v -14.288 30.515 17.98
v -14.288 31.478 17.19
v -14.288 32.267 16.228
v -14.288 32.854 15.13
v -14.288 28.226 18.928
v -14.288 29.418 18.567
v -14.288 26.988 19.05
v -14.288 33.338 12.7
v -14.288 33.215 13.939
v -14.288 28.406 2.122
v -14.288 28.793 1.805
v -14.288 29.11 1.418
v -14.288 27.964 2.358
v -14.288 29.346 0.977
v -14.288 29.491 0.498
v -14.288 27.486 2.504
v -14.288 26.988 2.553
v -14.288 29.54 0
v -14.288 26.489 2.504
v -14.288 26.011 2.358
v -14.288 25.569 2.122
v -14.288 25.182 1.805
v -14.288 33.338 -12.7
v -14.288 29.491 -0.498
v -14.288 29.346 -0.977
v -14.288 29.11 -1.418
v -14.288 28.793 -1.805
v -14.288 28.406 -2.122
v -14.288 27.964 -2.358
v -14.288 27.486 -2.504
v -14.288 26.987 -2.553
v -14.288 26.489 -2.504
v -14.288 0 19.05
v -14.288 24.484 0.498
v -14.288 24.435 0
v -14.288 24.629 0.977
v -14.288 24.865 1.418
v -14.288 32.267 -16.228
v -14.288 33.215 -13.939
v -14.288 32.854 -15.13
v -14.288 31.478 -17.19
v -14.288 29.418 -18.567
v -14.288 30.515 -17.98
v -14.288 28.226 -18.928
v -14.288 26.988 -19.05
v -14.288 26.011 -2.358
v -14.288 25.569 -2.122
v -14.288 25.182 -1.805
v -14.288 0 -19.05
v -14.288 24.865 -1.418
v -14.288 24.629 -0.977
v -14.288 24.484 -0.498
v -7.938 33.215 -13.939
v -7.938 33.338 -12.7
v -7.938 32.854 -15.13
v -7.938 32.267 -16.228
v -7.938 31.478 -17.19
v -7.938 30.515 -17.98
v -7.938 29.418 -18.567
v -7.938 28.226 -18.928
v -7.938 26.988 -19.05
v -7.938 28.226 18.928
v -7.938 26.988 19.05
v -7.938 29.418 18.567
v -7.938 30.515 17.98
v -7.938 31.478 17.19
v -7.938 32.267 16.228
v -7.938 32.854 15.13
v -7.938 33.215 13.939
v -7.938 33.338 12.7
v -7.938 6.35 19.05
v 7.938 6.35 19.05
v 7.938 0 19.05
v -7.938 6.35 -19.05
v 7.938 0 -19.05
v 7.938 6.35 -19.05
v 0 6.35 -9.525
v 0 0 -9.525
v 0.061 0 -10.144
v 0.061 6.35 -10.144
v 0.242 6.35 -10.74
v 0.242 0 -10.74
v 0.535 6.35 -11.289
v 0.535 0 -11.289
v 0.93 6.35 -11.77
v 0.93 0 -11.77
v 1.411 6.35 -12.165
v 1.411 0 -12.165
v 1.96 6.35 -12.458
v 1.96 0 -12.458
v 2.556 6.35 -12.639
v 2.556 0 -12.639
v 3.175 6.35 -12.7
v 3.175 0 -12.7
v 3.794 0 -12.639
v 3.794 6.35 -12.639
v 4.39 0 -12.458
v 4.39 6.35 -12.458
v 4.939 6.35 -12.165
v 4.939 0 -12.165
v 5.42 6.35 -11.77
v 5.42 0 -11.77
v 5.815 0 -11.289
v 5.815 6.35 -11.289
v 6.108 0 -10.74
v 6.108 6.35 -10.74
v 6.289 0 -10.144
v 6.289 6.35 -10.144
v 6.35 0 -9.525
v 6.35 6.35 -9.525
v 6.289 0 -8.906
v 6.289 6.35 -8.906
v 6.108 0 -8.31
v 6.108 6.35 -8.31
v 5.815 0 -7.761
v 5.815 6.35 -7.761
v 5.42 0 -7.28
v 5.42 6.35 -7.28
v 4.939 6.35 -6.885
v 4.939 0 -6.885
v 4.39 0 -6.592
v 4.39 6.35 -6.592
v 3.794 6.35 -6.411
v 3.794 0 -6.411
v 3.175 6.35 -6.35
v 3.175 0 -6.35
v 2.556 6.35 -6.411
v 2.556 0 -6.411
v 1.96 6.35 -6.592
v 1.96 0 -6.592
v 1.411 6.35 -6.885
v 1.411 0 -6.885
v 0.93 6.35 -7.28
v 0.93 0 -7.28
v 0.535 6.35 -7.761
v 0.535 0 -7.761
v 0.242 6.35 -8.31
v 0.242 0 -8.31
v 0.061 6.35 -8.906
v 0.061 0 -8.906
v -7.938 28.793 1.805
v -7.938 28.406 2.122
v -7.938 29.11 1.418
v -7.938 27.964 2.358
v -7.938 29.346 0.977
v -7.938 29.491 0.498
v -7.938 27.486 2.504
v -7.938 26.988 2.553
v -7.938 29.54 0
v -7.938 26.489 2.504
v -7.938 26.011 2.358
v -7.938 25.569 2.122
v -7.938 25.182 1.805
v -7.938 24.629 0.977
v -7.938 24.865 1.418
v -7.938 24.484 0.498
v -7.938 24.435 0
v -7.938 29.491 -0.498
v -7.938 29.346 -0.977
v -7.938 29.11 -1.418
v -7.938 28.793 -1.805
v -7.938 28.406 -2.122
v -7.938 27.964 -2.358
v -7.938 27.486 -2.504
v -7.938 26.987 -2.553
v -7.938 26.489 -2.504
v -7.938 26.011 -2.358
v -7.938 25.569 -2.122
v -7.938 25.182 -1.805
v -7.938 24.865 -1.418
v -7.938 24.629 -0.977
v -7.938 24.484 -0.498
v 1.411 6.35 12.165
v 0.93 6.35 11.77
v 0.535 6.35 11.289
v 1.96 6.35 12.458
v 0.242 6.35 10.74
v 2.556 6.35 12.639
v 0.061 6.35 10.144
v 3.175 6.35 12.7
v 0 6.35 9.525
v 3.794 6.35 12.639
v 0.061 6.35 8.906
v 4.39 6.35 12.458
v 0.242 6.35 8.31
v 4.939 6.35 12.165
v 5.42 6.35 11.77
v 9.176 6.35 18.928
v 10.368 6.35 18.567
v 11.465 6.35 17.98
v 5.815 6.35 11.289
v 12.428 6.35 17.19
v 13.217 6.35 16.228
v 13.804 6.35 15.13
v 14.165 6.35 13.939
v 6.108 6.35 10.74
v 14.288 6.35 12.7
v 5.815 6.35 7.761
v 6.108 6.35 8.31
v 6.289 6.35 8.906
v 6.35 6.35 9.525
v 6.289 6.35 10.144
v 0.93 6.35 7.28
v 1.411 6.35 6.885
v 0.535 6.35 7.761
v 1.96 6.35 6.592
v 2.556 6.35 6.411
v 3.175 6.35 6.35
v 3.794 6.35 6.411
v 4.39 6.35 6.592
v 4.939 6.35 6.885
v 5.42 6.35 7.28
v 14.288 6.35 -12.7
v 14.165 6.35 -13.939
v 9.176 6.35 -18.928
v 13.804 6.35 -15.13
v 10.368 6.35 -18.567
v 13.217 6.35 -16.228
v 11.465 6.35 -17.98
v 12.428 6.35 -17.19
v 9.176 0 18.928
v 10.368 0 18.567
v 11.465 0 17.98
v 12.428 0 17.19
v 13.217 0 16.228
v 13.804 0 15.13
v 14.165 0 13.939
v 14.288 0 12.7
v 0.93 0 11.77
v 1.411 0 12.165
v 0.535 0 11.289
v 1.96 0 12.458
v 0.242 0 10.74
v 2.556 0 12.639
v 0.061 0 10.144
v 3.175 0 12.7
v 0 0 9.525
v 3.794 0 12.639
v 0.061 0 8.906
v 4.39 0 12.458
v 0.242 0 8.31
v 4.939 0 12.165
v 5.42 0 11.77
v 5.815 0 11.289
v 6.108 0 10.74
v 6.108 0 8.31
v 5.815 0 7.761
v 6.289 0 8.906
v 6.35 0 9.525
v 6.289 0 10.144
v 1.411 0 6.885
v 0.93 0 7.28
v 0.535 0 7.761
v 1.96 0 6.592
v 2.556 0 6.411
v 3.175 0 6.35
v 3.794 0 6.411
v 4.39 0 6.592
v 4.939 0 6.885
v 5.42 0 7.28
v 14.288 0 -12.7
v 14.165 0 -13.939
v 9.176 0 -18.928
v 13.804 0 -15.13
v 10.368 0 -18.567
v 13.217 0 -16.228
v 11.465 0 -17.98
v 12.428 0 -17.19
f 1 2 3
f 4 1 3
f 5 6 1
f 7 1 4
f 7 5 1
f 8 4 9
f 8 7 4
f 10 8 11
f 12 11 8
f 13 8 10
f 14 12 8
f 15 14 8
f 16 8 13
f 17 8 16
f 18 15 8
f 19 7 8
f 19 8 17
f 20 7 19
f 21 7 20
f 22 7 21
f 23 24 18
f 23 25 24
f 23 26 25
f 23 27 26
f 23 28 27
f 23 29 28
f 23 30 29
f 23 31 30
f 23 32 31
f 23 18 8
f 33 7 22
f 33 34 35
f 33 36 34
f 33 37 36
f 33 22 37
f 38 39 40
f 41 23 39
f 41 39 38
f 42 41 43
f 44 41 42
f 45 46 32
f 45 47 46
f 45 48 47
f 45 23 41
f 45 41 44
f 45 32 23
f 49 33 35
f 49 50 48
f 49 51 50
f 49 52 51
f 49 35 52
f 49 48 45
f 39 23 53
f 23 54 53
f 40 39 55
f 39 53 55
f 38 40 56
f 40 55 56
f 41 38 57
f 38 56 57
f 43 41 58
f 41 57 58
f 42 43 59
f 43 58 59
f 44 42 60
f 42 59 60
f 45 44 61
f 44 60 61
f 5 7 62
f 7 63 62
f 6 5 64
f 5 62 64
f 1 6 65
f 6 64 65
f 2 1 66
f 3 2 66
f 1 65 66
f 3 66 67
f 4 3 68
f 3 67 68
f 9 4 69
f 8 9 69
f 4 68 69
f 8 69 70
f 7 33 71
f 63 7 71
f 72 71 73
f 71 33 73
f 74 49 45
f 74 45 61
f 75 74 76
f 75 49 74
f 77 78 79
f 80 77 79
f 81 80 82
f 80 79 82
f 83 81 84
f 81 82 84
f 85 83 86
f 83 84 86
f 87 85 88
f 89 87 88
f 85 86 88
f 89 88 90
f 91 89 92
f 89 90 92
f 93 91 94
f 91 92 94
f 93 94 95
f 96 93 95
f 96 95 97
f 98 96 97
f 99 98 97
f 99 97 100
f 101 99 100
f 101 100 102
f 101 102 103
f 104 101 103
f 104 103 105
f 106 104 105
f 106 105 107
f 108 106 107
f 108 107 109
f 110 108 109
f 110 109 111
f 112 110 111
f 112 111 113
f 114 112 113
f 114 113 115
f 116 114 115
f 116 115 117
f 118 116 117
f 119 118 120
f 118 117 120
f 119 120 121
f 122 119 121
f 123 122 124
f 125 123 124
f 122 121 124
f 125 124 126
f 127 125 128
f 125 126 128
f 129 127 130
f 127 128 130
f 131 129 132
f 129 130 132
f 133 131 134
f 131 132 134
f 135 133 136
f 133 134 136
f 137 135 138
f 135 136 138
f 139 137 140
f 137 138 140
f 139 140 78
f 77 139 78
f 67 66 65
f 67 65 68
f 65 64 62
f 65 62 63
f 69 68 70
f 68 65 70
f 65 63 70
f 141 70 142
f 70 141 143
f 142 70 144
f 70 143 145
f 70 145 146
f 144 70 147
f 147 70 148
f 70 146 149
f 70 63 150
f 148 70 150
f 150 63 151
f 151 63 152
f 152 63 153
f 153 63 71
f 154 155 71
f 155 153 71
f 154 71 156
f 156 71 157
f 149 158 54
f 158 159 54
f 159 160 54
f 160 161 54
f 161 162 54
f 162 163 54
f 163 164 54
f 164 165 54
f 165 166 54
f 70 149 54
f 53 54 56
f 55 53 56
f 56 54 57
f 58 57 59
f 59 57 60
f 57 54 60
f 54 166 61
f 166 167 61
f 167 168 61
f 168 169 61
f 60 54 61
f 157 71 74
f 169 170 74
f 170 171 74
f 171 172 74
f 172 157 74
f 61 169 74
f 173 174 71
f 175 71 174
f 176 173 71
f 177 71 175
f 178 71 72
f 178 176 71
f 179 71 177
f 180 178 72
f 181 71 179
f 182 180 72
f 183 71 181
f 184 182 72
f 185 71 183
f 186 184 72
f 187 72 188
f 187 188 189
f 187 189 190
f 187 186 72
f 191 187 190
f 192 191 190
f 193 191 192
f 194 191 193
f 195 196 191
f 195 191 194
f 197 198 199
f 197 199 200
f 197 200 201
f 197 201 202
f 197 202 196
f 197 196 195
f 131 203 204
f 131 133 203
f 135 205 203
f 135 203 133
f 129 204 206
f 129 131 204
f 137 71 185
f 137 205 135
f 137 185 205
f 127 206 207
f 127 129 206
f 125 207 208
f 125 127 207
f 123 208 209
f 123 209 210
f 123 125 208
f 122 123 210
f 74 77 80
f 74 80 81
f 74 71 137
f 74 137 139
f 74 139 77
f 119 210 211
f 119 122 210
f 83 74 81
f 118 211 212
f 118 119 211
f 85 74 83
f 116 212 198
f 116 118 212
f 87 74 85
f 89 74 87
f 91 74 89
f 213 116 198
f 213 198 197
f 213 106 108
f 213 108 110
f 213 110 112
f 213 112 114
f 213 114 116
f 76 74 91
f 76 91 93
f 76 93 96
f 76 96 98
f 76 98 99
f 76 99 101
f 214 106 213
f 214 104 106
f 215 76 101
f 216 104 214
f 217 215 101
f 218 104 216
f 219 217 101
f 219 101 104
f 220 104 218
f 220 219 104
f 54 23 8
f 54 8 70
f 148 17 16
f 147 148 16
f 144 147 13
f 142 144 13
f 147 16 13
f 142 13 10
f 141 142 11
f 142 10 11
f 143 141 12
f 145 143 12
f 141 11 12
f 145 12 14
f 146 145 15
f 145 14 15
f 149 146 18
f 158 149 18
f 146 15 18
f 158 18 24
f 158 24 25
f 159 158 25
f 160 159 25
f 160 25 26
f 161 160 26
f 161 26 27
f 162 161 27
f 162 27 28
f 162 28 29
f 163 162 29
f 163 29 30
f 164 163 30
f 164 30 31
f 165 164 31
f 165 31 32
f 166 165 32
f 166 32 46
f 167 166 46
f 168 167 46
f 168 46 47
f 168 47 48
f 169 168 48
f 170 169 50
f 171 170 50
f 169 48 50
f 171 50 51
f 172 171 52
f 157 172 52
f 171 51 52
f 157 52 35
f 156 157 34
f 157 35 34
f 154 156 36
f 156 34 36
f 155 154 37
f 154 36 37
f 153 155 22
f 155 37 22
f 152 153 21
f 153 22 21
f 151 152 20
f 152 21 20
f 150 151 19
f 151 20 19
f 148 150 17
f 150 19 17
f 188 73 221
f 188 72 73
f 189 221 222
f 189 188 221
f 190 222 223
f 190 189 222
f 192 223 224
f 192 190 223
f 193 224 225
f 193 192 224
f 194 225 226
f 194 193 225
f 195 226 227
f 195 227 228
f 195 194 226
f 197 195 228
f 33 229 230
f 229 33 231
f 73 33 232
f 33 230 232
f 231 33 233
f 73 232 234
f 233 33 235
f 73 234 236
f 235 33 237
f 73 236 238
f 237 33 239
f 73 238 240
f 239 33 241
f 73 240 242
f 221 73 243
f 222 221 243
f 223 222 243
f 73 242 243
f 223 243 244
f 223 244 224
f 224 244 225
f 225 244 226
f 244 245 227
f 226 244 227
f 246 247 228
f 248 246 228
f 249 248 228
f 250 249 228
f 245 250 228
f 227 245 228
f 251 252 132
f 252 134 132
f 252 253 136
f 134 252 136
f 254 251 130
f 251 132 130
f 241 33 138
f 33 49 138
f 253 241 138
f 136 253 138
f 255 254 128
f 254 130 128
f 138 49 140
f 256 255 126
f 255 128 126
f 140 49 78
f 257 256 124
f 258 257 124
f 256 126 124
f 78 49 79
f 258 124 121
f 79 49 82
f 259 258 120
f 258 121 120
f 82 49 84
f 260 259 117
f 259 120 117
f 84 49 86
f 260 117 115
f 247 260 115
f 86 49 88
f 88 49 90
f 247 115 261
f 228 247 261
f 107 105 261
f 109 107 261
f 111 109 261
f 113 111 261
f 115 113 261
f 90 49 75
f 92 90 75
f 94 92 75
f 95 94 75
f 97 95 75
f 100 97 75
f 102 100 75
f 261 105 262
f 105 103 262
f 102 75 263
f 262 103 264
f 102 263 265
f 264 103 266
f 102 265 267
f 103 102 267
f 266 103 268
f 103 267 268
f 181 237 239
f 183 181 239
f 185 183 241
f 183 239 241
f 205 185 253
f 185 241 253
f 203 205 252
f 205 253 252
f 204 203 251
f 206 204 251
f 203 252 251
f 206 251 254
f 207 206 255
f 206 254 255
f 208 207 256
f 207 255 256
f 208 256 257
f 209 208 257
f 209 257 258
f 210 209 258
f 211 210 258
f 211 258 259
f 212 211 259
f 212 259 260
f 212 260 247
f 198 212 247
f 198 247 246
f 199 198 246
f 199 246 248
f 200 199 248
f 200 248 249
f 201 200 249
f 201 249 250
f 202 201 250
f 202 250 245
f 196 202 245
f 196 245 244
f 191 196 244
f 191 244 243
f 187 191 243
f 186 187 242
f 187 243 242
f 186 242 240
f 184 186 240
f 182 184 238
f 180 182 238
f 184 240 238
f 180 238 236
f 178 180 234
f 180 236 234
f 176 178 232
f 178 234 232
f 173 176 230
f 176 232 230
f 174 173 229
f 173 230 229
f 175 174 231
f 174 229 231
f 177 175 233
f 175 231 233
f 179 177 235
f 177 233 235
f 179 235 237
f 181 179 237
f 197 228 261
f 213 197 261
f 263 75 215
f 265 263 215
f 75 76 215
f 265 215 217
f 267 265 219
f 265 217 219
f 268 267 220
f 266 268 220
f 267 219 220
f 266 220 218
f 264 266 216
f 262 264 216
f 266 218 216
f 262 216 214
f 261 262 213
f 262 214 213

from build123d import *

# Parameters (mm, degrees)
SKETCH8_W                   = 6.35
SKETCH8_H                   = 38.1
SKETCH8_W_2                 = 22.225
BOSS_EXTRUDE2_DEPTH         = 6.35
BOSS_EXTRUDE3_START         = 6.35
SKETCH8_3_W                 = 6.35
SKETCH8_3_H                 = 38.1
BOSS_EXTRUDE3_DEPTH         = 26.9875
F_1_4_0_25_DIAMETER_HOLE2_D = 6.35
F_1_4_20_TAPPED_HOLE1_D     = 5.1054
F_1_4_20_TAPPED_HOLE1_DEPTH = 16.51
F_1_4_20_TAPPED_HOLE1_TIP   = 1.533816902
FILLET1_R                   = 6.35
FILLET2_R                   = 6.35


with BuildPart() as part:
    # Sketch8 → Boss-Extrude2 (new body)
    with BuildSketch(Plane(origin=(0, 0, 0), x_dir=(1, 0, 0), z_dir=(0, 1, 0))):
        with Locations((-11.1125, 0)):
            Rectangle(SKETCH8_W, SKETCH8_H)
        with Locations((3.175, 0)):
            Rectangle(SKETCH8_W_2, SKETCH8_H)
    extrude(amount=BOSS_EXTRUDE2_DEPTH)

    # Sketch8<3> → Boss-Extrude3 (add)
    with BuildSketch(Plane(origin=(0, 0, 0), x_dir=(1, 0, 0), z_dir=(0, 1, 0)).offset(BOSS_EXTRUDE3_START)):
        with Locations((-11.1125, 0)):
            Rectangle(SKETCH8_3_W, SKETCH8_3_H)
    extrude(amount=BOSS_EXTRUDE3_DEPTH)

    # 1/4 (0.25) Diameter Hole2 (through all)
    with Locations(Plane(origin=(0, 6.35, 0), x_dir=(1, 0, 0), z_dir=(0, 1, 0))):
        with Locations((3.175, -9.525), (3.175, 9.525)):
            Hole(F_1_4_0_25_DIAMETER_HOLE2_D / 2)

    # 1/4-20 Tapped Hole1
    with Locations(Plane(origin=(-7.9375, 0, 0), x_dir=(0, 0, -1), z_dir=(1, 0, 0))):
        with Locations((0, 26.9875)):
            Hole(F_1_4_20_TAPPED_HOLE1_D / 2, depth=F_1_4_20_TAPPED_HOLE1_DEPTH)
            with Locations((0, 0, -(F_1_4_20_TAPPED_HOLE1_DEPTH + F_1_4_20_TAPPED_HOLE1_TIP / 2))):  # 118° drill point
                Cone(0, F_1_4_20_TAPPED_HOLE1_D / 2, F_1_4_20_TAPPED_HOLE1_TIP, mode=Mode.SUBTRACT)

    # Fillet1
    fillet1_edges = [part.edges().sort_by_distance(p)[0] for p in [
        (14.2875, 3.175, -19.05),
        (14.2875, 3.175, 19.05),
    ]]
    fillet(fillet1_edges, radius=FILLET1_R)

    # Fillet2
    fillet2_edges = [part.edges().sort_by_distance(p)[0] for p in [
        (-11.1125, 33.3375, 19.05),
        (-11.1125, 33.3375, -19.05),
    ]]
    fillet(fillet2_edges, radius=FILLET2_R)


solid = part.part
